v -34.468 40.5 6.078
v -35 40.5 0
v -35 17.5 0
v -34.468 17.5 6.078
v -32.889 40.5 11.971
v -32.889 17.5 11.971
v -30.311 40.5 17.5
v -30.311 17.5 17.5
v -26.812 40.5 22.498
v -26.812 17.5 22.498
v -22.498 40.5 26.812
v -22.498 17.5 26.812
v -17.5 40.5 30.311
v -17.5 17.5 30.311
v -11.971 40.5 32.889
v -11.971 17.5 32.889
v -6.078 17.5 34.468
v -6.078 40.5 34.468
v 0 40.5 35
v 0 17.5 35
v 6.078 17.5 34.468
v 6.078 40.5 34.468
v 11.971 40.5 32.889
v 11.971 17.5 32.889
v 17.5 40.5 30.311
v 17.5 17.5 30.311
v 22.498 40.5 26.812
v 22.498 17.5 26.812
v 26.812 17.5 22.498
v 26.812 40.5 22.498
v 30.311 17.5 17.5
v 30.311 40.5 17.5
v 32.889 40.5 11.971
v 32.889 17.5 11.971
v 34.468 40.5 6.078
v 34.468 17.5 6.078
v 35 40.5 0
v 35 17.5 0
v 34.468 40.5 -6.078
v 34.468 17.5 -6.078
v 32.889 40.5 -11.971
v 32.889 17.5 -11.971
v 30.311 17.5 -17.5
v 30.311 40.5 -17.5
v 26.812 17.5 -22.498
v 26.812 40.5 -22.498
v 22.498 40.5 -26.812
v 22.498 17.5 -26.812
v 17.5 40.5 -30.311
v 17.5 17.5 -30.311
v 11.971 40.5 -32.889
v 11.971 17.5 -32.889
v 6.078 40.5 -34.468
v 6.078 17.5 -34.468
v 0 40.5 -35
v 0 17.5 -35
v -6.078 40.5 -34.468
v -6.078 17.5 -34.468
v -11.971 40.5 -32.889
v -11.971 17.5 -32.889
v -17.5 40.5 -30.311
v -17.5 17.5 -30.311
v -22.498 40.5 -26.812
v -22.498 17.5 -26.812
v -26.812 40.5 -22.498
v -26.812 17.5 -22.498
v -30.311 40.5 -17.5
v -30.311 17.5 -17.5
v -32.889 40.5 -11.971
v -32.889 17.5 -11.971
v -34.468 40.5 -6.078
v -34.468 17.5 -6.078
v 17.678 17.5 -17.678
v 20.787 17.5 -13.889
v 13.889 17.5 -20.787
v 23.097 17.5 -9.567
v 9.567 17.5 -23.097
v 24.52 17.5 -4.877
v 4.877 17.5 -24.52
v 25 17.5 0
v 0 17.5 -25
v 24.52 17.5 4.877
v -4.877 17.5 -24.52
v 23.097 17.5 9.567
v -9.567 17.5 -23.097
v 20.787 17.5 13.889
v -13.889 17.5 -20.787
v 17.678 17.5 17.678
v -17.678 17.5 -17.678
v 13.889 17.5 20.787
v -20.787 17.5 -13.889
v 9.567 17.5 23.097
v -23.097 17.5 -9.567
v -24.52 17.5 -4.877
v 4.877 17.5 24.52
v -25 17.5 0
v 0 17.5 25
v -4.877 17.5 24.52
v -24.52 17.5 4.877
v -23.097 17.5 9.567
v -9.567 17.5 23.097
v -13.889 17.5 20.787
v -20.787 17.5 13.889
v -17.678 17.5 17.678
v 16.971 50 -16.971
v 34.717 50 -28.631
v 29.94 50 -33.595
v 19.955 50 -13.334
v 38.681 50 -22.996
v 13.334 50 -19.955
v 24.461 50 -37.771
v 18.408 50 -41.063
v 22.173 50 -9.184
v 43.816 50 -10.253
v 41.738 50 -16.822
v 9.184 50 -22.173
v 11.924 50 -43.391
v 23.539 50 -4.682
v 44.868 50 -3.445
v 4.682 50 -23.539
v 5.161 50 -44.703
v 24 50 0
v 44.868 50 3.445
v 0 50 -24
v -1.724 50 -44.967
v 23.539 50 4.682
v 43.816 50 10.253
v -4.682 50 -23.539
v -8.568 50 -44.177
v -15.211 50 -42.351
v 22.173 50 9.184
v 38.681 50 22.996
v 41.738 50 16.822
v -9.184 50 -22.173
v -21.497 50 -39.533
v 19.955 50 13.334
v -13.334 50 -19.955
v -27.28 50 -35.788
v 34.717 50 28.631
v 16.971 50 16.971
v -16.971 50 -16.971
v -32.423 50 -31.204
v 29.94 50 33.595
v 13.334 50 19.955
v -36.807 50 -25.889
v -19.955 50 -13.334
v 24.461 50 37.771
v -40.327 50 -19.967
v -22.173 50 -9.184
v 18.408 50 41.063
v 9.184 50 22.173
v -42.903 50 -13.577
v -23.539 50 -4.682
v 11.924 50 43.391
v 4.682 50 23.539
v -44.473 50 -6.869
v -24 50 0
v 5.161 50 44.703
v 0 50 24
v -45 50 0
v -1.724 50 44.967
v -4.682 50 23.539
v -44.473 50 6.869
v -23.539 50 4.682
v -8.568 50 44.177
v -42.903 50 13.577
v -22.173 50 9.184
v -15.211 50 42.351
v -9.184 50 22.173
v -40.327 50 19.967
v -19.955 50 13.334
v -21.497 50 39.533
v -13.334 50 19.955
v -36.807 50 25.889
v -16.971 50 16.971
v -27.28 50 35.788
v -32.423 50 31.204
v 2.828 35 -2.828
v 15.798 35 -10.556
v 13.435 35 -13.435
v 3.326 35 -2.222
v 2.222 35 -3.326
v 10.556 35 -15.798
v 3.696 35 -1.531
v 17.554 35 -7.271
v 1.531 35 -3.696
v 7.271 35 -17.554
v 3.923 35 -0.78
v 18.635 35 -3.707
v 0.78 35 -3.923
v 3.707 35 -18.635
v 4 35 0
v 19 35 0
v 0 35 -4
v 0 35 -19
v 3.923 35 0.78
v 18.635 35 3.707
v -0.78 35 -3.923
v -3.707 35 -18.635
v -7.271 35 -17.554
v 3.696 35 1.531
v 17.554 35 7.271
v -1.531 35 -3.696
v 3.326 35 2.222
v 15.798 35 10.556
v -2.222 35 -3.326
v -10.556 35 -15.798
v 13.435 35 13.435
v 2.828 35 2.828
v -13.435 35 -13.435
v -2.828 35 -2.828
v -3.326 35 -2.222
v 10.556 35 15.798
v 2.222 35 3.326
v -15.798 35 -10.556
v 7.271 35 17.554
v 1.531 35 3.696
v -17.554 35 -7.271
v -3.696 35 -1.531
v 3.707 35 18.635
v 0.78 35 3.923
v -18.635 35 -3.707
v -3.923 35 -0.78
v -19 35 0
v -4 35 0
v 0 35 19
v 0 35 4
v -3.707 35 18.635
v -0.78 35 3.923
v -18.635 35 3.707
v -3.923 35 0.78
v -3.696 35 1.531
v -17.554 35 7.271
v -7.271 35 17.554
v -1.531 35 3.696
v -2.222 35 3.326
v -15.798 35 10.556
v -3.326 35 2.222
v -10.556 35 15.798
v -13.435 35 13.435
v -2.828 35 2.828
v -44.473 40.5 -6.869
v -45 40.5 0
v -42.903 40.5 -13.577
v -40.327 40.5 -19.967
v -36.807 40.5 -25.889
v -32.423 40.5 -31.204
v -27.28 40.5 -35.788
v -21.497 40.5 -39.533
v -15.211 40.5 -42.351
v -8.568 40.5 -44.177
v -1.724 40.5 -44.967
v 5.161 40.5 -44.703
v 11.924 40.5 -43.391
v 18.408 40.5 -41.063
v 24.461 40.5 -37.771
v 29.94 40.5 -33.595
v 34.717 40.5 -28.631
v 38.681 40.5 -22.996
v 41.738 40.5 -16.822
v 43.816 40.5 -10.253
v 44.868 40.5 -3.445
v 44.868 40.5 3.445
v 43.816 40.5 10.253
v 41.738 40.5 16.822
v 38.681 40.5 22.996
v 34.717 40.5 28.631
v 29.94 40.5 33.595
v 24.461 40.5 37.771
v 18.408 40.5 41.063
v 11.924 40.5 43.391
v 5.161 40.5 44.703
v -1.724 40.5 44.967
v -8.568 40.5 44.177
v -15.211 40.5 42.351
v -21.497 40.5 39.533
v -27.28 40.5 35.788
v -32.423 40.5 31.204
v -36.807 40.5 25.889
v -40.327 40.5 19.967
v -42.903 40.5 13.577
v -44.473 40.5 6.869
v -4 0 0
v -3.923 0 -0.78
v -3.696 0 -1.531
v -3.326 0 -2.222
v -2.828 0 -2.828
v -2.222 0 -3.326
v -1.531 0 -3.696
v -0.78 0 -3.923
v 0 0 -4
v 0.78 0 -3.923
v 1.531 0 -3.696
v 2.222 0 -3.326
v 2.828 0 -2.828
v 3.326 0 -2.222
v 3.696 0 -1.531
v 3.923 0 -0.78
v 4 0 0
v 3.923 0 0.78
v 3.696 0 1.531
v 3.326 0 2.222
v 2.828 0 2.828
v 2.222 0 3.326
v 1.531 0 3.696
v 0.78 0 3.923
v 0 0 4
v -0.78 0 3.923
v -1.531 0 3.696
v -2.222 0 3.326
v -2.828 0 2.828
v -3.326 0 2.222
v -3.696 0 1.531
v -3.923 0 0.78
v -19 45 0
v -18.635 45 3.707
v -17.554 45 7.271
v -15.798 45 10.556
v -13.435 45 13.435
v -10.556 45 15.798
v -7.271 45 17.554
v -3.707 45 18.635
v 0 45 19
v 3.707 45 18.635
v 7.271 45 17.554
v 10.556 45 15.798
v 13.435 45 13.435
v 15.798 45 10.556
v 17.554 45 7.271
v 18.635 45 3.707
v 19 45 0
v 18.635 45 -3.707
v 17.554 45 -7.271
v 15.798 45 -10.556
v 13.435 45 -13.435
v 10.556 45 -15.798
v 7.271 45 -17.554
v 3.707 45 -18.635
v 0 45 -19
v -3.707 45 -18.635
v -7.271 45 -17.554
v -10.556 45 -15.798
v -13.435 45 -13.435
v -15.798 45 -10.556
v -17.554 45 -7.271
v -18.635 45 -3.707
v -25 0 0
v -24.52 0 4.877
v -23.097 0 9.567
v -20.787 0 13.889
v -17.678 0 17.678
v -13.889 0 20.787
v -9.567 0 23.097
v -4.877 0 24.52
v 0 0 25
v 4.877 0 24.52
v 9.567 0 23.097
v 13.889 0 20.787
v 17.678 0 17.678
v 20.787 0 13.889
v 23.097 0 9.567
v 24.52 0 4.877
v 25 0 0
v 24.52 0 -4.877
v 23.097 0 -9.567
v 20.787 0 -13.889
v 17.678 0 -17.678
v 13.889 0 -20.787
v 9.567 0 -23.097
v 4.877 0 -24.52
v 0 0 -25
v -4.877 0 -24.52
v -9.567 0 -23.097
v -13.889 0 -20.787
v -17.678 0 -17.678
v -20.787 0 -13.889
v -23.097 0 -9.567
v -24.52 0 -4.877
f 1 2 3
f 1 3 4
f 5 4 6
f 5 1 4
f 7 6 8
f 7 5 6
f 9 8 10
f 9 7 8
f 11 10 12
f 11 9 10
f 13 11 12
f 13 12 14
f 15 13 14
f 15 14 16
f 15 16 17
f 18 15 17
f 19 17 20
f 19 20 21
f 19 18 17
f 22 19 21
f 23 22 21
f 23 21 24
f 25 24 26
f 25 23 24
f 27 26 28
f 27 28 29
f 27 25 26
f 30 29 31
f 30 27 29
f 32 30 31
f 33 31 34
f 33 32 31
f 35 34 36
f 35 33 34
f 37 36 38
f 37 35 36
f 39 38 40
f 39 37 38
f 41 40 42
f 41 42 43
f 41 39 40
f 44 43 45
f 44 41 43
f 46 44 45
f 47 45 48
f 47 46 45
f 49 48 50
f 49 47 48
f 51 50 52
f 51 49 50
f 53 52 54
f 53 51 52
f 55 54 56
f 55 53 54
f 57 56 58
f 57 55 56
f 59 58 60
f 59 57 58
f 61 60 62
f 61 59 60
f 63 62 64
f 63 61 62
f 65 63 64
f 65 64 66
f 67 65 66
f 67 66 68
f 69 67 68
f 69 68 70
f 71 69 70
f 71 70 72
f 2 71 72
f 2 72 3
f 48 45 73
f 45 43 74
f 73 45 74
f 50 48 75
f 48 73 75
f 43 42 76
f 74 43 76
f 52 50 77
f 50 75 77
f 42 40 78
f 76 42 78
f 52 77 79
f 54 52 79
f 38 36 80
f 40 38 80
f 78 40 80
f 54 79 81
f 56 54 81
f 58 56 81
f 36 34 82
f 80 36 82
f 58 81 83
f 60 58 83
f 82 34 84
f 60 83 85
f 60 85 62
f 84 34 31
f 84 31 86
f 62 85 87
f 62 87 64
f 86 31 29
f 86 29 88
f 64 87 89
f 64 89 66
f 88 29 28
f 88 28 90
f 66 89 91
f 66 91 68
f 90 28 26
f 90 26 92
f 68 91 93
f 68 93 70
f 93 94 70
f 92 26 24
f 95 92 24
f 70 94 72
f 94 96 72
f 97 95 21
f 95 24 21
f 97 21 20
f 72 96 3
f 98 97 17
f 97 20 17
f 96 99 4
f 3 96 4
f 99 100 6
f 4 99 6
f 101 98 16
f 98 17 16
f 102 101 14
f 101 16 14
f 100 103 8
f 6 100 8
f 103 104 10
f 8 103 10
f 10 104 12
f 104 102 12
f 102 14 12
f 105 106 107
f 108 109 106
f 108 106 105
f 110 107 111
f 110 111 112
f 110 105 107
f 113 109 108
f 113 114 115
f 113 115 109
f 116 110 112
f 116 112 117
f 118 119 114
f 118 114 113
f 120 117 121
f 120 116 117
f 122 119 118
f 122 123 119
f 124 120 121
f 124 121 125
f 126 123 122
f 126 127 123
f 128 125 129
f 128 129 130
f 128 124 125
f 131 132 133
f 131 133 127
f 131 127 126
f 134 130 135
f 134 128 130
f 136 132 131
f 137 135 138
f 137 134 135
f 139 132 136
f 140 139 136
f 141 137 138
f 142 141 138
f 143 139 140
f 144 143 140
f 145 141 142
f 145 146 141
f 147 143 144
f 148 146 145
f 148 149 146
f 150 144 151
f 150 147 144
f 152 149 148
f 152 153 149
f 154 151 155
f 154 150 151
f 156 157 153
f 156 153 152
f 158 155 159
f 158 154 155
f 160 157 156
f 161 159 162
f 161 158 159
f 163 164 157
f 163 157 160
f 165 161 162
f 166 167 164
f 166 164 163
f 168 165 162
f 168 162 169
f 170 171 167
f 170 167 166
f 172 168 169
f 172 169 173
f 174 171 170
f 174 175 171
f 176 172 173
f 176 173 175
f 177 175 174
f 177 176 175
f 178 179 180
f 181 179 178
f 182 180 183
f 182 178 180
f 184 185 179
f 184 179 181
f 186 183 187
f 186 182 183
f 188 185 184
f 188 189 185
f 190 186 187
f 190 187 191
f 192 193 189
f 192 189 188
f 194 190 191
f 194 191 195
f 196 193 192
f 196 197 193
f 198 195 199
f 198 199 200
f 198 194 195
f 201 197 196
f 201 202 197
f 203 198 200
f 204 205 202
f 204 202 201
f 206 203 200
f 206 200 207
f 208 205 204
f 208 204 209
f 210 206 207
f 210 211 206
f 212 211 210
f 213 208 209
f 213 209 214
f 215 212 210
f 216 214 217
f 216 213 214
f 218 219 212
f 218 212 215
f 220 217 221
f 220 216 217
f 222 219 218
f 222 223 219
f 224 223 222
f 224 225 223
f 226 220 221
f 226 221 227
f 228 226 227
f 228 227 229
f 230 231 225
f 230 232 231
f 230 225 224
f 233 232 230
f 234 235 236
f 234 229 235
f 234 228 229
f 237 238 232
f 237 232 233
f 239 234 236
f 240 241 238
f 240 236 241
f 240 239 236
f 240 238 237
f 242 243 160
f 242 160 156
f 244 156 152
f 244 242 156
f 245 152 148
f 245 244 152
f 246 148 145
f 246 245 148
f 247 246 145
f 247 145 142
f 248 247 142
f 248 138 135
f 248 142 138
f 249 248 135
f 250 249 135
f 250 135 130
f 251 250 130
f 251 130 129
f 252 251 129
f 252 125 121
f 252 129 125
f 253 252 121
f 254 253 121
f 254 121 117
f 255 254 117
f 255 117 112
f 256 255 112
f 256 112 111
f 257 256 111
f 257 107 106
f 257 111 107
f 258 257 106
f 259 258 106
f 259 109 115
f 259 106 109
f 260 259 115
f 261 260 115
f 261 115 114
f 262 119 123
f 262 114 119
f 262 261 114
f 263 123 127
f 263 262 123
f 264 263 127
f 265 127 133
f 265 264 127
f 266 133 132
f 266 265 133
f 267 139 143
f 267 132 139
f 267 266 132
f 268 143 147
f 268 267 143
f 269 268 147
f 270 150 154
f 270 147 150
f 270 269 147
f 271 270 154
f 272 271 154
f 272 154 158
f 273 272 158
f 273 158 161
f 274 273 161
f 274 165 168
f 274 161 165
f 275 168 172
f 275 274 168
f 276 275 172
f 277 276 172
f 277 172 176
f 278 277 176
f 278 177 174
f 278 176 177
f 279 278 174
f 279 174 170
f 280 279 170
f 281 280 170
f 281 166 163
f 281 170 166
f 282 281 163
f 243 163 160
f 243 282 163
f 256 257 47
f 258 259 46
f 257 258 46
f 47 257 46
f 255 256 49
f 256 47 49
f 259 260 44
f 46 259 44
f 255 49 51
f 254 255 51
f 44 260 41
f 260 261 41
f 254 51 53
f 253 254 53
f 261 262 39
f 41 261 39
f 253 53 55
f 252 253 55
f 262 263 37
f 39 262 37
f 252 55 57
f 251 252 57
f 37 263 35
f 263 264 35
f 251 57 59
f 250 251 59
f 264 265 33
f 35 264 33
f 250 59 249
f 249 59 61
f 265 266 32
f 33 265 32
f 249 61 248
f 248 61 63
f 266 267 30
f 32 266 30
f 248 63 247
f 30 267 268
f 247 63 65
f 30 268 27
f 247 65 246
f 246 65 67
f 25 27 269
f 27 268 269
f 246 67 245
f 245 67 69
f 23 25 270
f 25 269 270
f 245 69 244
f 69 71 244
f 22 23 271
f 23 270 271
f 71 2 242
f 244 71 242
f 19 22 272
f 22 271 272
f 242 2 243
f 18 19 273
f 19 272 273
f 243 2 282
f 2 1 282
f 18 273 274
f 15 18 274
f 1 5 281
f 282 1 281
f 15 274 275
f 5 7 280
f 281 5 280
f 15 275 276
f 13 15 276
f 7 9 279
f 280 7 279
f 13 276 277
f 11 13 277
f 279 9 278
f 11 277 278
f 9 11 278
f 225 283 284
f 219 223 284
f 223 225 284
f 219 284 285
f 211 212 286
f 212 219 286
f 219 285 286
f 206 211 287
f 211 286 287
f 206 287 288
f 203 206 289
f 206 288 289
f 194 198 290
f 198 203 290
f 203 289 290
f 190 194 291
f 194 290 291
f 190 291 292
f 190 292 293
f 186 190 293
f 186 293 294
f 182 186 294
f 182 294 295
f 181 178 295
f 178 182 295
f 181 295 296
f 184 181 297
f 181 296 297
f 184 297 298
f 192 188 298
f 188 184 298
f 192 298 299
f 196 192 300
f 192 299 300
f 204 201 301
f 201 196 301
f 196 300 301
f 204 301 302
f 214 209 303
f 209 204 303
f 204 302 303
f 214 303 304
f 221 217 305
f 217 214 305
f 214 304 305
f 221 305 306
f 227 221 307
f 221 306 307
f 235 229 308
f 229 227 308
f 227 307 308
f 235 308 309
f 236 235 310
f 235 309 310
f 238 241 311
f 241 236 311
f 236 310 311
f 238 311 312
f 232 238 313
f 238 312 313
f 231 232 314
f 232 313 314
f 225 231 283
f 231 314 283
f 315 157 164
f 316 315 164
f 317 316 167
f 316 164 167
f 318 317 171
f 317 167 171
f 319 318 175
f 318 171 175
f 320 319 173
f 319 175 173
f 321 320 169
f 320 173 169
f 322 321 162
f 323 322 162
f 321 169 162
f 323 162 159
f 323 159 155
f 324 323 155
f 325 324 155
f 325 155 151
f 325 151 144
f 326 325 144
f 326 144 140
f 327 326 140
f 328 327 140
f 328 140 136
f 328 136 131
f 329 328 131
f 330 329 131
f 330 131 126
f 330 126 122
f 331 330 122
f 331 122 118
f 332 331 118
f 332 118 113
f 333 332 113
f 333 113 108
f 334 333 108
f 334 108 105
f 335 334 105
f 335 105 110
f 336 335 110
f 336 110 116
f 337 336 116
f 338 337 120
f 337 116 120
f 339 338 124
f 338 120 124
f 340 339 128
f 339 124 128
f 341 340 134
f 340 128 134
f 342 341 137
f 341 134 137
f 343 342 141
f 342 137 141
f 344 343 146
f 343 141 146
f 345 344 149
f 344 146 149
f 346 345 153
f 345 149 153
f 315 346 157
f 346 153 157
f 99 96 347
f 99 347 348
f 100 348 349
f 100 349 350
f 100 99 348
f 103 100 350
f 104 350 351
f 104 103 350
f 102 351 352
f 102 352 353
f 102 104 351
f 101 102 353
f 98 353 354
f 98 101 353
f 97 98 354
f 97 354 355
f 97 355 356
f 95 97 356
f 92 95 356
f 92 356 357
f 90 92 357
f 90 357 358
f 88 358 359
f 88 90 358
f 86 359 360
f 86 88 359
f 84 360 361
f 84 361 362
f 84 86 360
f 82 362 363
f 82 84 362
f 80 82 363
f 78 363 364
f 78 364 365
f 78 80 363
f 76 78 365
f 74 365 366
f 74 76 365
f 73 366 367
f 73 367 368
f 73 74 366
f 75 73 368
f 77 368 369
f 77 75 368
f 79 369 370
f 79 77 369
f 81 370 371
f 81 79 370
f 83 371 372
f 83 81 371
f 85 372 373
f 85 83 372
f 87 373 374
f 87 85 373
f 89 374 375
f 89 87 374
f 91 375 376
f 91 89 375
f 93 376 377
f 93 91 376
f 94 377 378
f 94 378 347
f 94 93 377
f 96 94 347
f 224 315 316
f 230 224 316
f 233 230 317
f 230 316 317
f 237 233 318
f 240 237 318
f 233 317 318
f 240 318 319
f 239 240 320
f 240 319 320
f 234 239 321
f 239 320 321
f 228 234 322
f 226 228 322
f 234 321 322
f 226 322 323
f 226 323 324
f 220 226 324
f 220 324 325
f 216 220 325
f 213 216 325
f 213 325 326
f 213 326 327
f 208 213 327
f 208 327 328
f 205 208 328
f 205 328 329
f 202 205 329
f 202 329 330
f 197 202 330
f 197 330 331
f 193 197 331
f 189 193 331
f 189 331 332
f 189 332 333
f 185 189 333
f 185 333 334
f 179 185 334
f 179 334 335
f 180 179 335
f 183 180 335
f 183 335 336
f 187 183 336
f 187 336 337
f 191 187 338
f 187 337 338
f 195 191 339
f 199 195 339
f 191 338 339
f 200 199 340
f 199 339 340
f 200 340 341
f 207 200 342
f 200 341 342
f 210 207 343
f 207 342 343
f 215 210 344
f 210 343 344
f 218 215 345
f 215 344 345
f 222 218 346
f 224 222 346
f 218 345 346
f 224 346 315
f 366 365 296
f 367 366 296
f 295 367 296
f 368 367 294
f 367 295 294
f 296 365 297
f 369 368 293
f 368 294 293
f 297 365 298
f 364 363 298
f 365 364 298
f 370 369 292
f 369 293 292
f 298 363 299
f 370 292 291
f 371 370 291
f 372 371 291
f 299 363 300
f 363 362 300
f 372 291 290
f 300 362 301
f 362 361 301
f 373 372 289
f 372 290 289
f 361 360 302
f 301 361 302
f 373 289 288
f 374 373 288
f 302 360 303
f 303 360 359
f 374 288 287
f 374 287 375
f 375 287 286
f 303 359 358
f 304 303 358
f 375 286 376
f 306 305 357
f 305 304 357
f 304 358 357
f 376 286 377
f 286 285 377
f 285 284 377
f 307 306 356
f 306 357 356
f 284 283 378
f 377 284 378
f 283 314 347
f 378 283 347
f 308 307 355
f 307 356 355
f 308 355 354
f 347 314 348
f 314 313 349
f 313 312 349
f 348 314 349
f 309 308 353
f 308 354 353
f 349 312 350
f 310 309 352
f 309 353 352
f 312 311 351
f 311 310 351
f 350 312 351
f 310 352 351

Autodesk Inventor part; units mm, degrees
ref_plane "YZ Plane" through (0, 0, 0) normal (1, 0, 0) x (0, 1, 0)
ref_plane "XZ Plane" through (0, 0, 0) normal (0, 1, 0) x (-1, 0, 0)
ref_plane "XY Plane" through (0, 0, 0) normal (0, 0, 1) x (1, 0, 0)
sketch "Sketch2" plane through (0, 0, 0) normal (0, 0, 1) x (1, 0, 0)
  line L0 (-4, 0) -> (-25, 0)
  line L1 (-25, 0) -> (-25, 17.5)
  line L2 (-25, 17.5) -> (-35, 17.5)
  line L3 (-4, 35) -> (-4, 0)
  line L4 (0, 0) -> (0, 29) construction
  line L5 (-4, 35) -> (-19, 35)
  line L6 (-19, 35) -> (-19, 50)
  line L7 (-35, 17.5) -> (-35, 40.5)
  line L8 (-19, 50) -> (-45, 50)
  line L9 (-45, 50) -> (-45, 40.5)
  line L10 (-45, 40.5) -> (-35, 40.5)
  dimension "d11" = 8
  dimension "d13" = 50
  dimension "d28" = 17.5
  dimension "d29" = 35
  dimension "d30" = 15
  dimension "d34" = 70
  dimension "d35" = 50
  dimension "d36" = 23
  dimension "d37" = 90
revolve "Revolution1" add sketch "Sketch2" angle 360 about axis through (0, 0, 0) along (0, 1, 0)
chamfer "Chamfer1" distance 5 angle 45 1 edges at (19, 50, 0)
properties part number "M17 - Coil Support Part" material "UHMW, Black"
